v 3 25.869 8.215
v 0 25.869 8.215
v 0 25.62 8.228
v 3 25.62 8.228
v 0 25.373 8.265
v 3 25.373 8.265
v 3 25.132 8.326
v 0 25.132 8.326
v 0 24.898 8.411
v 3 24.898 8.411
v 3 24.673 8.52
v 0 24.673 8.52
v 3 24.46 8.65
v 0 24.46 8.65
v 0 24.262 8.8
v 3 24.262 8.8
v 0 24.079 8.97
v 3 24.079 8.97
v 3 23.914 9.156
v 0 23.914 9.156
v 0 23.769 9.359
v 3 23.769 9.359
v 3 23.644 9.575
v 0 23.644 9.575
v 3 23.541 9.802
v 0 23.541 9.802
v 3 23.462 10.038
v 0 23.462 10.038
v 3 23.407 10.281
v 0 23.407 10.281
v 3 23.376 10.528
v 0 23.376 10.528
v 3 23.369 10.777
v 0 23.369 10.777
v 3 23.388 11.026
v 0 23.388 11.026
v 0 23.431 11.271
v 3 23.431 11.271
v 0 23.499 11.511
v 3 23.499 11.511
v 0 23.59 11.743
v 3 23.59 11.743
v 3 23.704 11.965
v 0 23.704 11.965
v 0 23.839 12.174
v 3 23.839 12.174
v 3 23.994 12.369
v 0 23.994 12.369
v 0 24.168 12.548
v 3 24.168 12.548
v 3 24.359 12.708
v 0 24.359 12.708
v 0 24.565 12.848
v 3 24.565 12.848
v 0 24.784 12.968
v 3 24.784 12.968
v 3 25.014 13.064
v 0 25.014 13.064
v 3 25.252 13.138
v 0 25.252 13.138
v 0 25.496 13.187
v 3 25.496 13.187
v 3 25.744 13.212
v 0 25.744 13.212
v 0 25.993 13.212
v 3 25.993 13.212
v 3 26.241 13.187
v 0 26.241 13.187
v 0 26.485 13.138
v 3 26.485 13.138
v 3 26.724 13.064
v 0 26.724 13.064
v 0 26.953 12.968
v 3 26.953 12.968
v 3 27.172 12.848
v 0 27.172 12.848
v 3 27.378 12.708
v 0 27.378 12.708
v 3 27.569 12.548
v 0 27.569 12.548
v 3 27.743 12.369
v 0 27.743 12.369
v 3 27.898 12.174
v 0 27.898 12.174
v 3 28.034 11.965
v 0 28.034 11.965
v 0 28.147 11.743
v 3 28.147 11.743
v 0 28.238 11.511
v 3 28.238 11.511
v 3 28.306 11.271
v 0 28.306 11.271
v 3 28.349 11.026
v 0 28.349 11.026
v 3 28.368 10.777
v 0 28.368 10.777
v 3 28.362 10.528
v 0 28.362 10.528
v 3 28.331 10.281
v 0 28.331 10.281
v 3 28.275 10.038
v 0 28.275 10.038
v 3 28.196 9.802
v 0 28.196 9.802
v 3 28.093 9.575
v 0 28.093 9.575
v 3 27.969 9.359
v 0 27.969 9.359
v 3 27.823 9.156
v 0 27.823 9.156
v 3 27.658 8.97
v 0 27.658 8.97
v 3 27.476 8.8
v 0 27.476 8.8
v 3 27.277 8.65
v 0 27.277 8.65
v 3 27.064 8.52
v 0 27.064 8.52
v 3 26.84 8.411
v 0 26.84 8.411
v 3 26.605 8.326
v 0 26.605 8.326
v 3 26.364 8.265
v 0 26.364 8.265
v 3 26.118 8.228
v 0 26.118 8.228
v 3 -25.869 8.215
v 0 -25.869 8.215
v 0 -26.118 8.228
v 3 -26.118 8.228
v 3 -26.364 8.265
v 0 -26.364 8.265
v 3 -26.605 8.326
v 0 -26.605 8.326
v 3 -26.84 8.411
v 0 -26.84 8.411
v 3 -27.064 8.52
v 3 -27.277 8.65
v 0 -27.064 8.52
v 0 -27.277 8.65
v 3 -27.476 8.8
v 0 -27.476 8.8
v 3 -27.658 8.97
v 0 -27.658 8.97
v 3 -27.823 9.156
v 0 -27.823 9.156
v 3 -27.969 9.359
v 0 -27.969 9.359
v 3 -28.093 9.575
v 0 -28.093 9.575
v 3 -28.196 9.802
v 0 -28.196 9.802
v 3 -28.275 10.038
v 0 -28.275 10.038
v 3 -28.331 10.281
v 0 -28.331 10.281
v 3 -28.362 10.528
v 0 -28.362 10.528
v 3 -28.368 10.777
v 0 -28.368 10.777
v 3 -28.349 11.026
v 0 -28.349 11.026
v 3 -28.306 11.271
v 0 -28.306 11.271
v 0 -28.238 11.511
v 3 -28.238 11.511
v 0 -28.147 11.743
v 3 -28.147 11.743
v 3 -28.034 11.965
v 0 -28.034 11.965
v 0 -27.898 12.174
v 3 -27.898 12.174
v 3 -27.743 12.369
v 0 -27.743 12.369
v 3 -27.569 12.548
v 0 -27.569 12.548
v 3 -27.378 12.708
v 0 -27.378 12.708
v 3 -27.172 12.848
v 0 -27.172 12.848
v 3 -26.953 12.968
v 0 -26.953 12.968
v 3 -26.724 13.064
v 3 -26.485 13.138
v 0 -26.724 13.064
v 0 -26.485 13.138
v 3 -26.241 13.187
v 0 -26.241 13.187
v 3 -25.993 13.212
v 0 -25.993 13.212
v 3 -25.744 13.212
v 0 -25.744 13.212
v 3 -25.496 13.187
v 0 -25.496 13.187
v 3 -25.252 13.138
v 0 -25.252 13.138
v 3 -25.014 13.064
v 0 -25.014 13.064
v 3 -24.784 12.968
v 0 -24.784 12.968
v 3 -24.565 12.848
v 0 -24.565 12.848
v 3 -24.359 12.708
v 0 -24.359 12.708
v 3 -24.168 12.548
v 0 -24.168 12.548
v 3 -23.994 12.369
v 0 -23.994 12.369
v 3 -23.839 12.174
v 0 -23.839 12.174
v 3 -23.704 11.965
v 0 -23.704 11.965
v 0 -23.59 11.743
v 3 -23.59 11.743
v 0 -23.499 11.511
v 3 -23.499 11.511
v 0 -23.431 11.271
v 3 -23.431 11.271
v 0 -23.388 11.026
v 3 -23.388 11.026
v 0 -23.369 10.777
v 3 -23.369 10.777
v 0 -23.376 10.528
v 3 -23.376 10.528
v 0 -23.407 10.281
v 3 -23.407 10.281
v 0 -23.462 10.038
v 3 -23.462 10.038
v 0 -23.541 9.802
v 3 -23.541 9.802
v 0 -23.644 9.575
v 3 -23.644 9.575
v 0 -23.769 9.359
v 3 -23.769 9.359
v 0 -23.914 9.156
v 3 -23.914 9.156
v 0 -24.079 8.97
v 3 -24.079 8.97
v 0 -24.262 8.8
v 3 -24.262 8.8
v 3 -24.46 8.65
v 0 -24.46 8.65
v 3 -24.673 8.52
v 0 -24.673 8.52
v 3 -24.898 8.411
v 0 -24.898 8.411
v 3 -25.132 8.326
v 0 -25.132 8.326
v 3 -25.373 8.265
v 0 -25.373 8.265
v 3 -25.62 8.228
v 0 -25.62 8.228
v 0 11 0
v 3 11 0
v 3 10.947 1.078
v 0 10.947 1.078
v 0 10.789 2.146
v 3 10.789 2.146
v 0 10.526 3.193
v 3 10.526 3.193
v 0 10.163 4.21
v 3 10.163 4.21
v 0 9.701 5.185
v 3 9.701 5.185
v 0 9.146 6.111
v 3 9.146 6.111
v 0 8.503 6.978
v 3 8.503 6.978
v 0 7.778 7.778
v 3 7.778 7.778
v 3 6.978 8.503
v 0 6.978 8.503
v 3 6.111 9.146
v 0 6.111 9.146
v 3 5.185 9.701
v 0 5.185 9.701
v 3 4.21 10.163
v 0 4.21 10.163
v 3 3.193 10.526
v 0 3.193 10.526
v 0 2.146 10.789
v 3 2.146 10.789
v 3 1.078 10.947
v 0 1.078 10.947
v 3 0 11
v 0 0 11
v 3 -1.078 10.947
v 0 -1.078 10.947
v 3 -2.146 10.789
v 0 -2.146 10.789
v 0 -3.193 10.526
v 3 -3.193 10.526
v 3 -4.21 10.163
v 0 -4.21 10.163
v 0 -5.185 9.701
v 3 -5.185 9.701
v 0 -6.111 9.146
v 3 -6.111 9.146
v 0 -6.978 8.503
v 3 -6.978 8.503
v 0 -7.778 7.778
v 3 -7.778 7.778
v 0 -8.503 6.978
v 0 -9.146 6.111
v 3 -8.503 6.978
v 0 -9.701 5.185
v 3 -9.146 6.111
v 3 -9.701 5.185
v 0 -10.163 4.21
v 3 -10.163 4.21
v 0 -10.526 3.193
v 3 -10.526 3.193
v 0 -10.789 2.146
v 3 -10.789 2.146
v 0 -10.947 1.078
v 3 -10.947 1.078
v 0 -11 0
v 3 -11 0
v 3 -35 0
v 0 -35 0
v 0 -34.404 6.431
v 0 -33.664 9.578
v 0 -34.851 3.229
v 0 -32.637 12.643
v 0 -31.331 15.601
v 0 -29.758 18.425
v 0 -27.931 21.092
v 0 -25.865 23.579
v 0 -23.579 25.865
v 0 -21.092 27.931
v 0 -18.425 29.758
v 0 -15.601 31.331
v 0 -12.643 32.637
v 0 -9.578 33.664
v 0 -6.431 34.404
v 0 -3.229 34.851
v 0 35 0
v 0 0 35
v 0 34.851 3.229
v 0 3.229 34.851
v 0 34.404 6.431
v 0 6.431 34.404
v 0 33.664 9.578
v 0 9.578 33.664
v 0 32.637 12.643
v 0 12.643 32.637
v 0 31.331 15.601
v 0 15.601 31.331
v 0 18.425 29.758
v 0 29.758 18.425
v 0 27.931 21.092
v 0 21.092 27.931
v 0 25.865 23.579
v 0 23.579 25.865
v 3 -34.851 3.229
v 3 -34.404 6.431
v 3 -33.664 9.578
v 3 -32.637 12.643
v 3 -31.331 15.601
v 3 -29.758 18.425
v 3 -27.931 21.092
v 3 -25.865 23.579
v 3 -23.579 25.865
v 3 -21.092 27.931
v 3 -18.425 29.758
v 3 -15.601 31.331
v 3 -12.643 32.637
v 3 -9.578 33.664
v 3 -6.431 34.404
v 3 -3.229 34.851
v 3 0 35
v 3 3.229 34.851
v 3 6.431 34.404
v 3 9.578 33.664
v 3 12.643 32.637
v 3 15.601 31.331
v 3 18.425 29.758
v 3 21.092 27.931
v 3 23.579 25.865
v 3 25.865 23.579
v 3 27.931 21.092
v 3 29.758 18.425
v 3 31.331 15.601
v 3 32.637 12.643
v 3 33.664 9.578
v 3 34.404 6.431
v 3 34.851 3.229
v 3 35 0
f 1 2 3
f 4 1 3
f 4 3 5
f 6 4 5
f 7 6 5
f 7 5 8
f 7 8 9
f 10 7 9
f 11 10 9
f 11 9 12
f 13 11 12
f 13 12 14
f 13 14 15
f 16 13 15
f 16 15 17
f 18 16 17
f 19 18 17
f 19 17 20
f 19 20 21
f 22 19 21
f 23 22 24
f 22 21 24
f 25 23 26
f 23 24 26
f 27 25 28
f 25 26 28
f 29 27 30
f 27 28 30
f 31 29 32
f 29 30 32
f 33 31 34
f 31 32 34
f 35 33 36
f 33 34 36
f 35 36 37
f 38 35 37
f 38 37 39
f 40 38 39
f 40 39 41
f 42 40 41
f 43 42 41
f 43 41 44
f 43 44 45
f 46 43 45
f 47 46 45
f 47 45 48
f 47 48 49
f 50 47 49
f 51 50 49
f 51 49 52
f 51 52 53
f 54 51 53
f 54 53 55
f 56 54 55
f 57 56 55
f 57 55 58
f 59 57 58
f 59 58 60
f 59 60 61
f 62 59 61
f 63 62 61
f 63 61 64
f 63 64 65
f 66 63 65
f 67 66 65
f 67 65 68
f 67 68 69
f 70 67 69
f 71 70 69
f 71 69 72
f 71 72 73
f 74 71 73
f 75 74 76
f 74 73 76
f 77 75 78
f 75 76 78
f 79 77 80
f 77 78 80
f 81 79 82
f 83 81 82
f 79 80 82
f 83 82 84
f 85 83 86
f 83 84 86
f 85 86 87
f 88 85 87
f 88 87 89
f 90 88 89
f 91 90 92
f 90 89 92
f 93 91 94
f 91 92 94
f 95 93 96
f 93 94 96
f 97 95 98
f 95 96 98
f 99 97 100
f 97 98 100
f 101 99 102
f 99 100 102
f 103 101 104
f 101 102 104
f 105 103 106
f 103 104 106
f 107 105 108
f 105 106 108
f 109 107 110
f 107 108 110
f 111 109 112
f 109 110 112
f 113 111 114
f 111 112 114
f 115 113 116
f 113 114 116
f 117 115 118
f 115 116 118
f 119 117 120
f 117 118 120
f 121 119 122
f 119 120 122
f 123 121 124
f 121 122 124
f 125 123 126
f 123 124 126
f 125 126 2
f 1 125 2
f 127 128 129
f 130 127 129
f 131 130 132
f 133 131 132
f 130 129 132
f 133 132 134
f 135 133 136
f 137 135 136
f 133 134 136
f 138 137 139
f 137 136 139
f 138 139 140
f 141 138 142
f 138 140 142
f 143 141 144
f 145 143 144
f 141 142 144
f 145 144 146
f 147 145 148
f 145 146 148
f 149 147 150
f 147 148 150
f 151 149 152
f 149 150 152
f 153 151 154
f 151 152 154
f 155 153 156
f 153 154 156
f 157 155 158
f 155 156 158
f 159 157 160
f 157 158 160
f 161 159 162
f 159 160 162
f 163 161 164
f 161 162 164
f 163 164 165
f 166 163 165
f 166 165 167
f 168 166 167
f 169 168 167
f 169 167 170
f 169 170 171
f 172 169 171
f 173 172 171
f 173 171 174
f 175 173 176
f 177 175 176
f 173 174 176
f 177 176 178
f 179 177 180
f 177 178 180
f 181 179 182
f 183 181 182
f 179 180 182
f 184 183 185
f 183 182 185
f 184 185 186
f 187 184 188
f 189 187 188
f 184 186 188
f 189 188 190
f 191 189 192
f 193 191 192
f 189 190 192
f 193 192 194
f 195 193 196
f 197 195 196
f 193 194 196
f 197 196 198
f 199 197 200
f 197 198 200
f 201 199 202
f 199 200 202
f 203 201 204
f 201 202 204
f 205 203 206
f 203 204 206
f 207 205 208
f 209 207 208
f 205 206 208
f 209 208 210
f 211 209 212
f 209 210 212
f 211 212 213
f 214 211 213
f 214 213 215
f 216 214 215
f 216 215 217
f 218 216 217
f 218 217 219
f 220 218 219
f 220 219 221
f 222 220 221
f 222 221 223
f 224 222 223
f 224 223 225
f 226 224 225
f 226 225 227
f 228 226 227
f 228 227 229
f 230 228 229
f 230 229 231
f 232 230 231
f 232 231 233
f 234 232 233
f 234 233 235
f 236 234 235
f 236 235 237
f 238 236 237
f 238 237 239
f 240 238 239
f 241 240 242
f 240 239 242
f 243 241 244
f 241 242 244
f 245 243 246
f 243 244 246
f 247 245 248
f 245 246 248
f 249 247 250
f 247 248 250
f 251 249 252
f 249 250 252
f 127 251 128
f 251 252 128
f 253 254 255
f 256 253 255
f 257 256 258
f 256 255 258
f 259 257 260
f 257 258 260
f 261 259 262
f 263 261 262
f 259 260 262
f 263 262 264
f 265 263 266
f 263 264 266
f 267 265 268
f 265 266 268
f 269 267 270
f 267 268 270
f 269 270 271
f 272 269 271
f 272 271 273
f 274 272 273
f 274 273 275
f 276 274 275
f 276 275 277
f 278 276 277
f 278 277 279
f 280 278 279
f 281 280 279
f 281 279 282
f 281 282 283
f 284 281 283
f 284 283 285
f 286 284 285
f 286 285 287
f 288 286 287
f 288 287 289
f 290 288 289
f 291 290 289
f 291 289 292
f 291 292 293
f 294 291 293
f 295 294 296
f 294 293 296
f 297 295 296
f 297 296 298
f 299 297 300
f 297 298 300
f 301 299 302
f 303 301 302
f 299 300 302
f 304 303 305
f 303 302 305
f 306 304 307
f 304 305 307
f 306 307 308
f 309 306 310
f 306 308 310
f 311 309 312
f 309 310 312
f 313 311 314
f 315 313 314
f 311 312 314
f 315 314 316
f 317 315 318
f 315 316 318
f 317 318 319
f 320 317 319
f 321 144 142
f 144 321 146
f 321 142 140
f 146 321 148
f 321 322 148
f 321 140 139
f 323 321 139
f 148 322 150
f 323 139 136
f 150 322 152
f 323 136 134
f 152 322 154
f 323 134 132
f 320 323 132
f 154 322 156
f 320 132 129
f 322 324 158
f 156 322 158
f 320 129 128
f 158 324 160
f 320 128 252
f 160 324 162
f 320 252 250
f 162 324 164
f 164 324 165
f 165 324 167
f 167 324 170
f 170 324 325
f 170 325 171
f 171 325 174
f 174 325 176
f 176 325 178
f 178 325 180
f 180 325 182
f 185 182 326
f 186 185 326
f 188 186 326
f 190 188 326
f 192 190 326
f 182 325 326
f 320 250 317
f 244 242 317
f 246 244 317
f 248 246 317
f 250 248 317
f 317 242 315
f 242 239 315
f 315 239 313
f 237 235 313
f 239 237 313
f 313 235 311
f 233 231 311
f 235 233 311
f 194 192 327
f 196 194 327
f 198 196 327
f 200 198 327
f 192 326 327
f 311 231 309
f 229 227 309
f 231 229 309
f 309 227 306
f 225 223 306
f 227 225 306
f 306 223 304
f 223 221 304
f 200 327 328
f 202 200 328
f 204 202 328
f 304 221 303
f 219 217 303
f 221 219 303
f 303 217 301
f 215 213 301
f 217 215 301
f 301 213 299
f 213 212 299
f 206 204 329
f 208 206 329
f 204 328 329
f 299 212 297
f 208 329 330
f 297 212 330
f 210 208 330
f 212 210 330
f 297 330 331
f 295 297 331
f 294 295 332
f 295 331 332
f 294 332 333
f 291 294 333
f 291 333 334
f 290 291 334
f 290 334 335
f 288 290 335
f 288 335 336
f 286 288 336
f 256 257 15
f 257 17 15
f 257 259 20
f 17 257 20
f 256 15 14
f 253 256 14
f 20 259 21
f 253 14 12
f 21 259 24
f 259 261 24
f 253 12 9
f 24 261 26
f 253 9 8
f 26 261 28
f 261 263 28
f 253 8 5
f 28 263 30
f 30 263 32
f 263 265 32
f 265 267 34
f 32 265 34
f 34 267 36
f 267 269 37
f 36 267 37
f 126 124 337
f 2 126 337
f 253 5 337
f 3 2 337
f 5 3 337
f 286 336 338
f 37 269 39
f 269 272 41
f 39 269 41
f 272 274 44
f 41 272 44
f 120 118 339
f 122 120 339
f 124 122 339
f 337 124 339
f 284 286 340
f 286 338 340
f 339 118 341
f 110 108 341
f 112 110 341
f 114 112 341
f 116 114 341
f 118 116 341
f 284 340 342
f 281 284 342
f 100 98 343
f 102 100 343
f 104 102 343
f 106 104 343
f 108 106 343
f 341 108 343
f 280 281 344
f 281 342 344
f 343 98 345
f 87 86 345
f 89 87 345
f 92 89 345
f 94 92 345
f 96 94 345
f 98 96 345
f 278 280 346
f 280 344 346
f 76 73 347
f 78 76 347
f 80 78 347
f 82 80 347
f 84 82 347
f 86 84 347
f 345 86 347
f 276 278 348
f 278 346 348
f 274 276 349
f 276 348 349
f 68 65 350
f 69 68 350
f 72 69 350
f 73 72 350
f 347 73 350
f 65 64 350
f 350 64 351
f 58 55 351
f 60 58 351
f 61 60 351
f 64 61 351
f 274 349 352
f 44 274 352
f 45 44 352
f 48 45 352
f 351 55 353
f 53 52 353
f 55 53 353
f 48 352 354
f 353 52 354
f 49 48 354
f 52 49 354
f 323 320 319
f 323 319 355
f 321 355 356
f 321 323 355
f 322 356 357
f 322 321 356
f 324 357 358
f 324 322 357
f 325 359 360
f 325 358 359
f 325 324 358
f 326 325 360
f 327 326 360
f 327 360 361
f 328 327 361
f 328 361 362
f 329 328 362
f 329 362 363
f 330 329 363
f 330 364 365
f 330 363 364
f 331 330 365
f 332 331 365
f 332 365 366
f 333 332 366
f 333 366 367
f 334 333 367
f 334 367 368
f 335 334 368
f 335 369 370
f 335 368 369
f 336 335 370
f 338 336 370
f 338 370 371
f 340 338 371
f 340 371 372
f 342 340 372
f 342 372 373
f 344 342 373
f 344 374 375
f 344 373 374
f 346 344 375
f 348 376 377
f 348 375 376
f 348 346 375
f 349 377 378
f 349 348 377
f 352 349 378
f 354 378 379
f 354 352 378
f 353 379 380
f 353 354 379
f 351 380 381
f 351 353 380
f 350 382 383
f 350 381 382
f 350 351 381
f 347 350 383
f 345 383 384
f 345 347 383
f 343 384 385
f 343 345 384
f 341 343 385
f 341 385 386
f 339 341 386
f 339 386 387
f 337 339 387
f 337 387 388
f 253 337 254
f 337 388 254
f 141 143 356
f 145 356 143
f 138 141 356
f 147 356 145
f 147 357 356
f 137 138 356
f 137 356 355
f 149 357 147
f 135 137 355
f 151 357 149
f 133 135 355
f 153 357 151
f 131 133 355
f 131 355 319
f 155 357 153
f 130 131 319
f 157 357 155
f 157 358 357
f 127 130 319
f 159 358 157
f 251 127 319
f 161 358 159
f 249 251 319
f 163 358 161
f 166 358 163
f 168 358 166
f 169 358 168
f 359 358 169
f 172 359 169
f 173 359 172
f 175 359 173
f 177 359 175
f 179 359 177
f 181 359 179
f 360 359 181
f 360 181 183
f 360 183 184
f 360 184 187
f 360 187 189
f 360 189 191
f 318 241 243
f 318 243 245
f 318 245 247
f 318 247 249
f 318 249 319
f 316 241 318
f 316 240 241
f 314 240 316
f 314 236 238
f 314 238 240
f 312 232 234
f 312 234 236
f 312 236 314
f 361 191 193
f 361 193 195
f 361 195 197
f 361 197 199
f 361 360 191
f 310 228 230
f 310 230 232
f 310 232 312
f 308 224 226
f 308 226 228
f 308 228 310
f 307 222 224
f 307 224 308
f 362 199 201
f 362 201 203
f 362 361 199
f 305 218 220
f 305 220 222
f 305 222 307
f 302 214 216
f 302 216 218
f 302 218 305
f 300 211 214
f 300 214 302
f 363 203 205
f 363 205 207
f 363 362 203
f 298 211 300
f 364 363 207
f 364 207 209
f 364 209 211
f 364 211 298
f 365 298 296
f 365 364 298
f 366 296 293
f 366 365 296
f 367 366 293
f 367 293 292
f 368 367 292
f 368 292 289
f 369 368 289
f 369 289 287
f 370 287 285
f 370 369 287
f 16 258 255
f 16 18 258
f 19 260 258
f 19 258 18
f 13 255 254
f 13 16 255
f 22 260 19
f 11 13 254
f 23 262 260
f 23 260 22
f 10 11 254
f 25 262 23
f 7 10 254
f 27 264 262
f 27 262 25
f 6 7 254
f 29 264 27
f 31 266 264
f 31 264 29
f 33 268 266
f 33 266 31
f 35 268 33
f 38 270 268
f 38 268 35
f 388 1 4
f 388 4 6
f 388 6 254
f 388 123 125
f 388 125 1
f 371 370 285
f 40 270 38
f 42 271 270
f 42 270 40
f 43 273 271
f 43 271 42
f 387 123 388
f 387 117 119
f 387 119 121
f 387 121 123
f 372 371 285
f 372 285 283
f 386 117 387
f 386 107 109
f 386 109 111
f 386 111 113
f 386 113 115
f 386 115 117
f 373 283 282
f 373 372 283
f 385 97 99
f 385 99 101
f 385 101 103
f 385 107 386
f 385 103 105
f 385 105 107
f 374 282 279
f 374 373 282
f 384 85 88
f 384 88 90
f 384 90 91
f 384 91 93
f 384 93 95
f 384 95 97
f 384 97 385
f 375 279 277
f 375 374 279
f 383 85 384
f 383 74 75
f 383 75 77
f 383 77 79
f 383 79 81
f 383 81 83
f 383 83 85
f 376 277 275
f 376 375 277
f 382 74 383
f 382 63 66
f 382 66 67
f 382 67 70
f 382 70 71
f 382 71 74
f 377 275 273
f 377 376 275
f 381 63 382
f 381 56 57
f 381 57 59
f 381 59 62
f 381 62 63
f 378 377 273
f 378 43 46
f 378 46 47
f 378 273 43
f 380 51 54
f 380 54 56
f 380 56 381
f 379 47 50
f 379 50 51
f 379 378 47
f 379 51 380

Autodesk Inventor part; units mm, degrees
ref_plane "YZ Plane" through (0, 0, 0) normal (1, 0, 0) x (0, 1, 0)
ref_plane "XZ Plane" through (0, 0, 0) normal (0, 1, 0) x (-1, 0, 0)
ref_plane "XY Plane" through (0, 0, 0) normal (0, 0, 1) x (1, 0, 0)
sketch "Sketch1" plane through (0, 0, 0) normal (1, 0, 0) x (0, 1, 0)
  circle A0 centre (0, 0) radius 35
  dimension "d0" = 70
extrude "Extrusion1" add sketch "Sketch1" along normal blind 3
sketch "Sketch2" plane through (3, 0, 0) normal (1, 0, 0) x (0, 0, -1)
  circle A0 centre (0, 0) radius 11
  circle A1 centre (0, 0) radius 35 projected
  circle A2 centre (0, 0) radius 35 projected
  line L0 (0, 35) -> (0, -35)
  point P0 (0, 11)
  point P1 (0, -11)
  dimension "d3" = 22
extrude "Extrusion2" cut sketch "Sketch2" against normal blind 3 contours A0 L0 | A0 L0 A1 | L0 A0 picked at (26.6156, -3.412)
sketch "Sketch3" plane through (3, 0, 0) normal (1, 0, 0) x (0, 0, -1)
  line L0 (0, 11) -> (0, 35) projected
  arc A0 (0, 35) -> (0, -35) centre (0, 0) ccw projected
  line L1 (0, -35) -> (0, -11) projected
  arc A1 (0, 11) -> (0, -11) centre (0, 0) ccw projected
  circle A2 centre (0, 0) radius 28 construction
  line L2 (0, 0) -> (-10.7151, 25.8686)
  line L3 (0, 0) -> (-10.7151, -25.8686)
  dimension "d6" = 56
  dimension "d7" = 22.5
  dimension "d8" = 22.5
hole "Hole1" at (3, 25.8686, 10.7151) at (3, -25.8686, 10.7151) direction (-1, 0, 0) diameter 5 end through all
properties part number "P004" material "Steel, Alloy"
